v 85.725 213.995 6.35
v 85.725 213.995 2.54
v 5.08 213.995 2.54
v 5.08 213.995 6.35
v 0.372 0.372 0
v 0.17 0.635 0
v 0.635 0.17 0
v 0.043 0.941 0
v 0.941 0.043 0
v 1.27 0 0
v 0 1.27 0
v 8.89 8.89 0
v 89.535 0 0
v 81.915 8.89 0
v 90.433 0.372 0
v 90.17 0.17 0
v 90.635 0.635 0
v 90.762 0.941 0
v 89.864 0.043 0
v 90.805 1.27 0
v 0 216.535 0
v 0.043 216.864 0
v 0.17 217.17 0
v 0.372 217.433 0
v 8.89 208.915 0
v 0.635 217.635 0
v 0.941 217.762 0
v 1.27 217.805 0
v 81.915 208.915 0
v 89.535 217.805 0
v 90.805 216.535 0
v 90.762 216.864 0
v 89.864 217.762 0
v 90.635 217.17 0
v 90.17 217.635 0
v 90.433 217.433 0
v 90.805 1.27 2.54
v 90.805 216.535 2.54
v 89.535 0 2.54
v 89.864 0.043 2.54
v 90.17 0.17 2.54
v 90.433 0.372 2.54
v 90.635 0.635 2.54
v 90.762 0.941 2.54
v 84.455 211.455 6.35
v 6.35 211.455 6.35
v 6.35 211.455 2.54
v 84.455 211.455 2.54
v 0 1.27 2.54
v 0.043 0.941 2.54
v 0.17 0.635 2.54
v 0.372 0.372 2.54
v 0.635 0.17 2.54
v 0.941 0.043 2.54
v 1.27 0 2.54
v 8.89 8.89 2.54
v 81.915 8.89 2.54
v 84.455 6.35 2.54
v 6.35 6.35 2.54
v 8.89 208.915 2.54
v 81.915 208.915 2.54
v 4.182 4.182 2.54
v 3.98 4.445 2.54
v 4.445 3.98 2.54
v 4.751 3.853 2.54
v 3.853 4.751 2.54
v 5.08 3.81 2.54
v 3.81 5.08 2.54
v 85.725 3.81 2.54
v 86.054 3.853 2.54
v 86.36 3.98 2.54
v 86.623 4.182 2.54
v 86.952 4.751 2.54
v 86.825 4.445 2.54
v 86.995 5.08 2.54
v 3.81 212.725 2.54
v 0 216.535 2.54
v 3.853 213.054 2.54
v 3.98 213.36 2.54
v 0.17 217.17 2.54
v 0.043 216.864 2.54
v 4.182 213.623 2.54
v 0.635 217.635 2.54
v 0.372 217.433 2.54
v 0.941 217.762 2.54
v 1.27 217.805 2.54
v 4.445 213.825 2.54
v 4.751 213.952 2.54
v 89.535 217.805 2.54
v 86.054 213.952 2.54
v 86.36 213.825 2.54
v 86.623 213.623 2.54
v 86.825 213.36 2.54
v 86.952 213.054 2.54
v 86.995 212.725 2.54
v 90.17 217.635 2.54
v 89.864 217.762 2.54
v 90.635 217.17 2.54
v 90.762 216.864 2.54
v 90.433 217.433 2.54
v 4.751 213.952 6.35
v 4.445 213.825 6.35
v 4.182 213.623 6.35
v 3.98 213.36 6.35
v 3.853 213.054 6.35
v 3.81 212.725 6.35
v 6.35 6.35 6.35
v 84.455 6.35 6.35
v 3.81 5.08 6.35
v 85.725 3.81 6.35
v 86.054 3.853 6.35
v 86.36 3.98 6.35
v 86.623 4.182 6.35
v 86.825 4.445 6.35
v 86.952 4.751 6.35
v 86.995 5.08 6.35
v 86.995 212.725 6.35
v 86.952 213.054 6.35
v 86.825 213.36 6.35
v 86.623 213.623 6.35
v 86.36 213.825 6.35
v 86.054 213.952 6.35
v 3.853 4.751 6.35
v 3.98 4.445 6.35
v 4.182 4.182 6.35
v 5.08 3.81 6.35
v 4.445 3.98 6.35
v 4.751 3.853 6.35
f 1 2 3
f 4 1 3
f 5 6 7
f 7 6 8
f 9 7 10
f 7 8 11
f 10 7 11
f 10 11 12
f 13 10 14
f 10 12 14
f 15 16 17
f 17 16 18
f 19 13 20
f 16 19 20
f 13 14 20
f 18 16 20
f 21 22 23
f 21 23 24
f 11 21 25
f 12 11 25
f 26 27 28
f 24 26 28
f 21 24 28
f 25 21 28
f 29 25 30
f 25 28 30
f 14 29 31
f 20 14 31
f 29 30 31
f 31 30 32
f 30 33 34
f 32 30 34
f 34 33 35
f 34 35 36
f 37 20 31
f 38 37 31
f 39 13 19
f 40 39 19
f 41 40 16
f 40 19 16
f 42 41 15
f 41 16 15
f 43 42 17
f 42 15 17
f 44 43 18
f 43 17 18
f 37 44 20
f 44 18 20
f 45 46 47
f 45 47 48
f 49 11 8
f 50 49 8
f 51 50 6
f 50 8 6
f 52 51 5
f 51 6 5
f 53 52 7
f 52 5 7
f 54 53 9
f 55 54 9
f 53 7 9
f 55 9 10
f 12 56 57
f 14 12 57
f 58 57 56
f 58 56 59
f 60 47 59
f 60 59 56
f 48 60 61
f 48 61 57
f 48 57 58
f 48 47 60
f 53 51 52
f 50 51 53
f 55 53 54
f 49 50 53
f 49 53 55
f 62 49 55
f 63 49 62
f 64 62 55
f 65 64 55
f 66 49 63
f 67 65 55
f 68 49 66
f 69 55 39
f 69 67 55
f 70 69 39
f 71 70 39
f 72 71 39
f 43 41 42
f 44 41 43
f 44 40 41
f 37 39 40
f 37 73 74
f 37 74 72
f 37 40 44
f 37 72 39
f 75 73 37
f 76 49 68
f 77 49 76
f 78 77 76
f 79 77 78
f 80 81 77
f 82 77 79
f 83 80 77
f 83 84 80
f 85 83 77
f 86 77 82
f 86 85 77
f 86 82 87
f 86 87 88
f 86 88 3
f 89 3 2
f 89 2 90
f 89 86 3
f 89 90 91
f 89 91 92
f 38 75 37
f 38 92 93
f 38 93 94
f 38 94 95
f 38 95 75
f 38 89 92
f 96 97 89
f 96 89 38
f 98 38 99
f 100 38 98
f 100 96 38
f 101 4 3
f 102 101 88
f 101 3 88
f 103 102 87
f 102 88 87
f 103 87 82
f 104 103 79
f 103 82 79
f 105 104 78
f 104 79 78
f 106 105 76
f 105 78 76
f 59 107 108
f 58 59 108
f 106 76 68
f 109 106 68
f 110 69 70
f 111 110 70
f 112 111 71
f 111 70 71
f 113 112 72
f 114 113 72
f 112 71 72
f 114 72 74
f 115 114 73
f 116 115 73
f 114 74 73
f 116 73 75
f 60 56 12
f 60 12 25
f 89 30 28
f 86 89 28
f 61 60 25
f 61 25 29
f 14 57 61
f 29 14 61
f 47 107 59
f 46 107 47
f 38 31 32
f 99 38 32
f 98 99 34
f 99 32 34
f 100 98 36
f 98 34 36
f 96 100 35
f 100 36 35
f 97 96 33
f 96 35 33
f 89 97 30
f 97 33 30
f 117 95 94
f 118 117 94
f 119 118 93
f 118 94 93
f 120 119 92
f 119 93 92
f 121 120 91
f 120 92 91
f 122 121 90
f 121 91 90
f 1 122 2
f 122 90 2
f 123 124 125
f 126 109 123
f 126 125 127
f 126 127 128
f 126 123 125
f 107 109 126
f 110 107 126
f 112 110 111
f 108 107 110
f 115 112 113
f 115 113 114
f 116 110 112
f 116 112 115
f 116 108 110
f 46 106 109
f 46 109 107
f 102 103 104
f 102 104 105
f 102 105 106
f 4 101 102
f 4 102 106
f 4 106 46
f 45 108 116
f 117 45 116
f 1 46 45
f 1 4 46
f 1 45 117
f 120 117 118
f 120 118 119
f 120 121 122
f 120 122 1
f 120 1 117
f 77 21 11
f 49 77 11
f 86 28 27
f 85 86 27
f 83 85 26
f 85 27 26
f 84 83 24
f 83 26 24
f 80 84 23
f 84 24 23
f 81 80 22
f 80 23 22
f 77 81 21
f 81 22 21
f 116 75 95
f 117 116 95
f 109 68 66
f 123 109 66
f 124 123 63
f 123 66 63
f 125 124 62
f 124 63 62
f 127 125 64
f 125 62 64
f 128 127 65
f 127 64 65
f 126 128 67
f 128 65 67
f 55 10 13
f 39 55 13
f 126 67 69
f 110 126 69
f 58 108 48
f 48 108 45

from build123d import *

# Parameters (mm, degrees)
F1_DEPTH = 2.54
F3_DEPTH = 6.35
F4_W     = 78.105
F4_H     = 205.105
F5_DEPTH = 3.81
F6_W     = 73.025
F6_H     = 200.025
F7_DEPTH = 2.54


with BuildPart() as f1:
    # F0 (on Top) → F1 (new body)
    with BuildSketch(Plane.XY):
        with BuildLine():
            ThreePointArc((0, 1.27), (0.371974, 0.371974), (1.27, 0))
            Line((1.27, 0), (89.535, 0))
            ThreePointArc((89.535, 0), (90.433026, 0.371974), (90.805, 1.27))
            Line((90.805, 1.27), (90.805, 216.535))
            ThreePointArc((90.805, 216.535), (90.433026, 217.433026), (89.535, 217.805))
            Line((89.535, 217.805), (1.27, 217.805))
            ThreePointArc((1.27, 217.805), (0.371974, 217.433026), (0, 216.535))
            Line((0, 216.535), (0, 1.27))
        make_face()
    extrude(amount=F1_DEPTH)

    # F2 (on Top) → F3 (join)
    with BuildSketch(Plane.XY):
        with BuildLine():
            Line((3.81, 212.725), (3.81, 5.08))
            ThreePointArc((3.81, 5.08), (4.181974, 4.181974), (5.08, 3.81))
            Line((5.08, 3.81), (85.725, 3.81))
            ThreePointArc((85.725, 3.81), (86.623026, 4.181974), (86.995, 5.08))
            Line((86.995, 5.08), (86.995, 212.725))
            ThreePointArc((86.995, 212.725), (86.623026, 213.623026), (85.725, 213.995))
            Line((85.725, 213.995), (5.08, 213.995))
            ThreePointArc((5.08, 213.995), (4.181974, 213.623026), (3.81, 212.725))
        make_face()
    extrude(amount=F3_DEPTH)

    # F4 (on face) → F5 (cut)
    with BuildSketch(Plane.XY.offset(6.35)):
        with Locations((45.4025, 108.9025)):
            Rectangle(F4_W, F4_H)
    extrude(amount=-F5_DEPTH, mode=Mode.SUBTRACT)

    # F6 (on face) → F7 (cut)
    with BuildSketch(Plane.XY.offset(2.54)):
        with Locations((45.4025, 108.9025)):
            Rectangle(F6_W, F6_H)
    extrude(amount=-F7_DEPTH, mode=Mode.SUBTRACT)


solid = f1.part
